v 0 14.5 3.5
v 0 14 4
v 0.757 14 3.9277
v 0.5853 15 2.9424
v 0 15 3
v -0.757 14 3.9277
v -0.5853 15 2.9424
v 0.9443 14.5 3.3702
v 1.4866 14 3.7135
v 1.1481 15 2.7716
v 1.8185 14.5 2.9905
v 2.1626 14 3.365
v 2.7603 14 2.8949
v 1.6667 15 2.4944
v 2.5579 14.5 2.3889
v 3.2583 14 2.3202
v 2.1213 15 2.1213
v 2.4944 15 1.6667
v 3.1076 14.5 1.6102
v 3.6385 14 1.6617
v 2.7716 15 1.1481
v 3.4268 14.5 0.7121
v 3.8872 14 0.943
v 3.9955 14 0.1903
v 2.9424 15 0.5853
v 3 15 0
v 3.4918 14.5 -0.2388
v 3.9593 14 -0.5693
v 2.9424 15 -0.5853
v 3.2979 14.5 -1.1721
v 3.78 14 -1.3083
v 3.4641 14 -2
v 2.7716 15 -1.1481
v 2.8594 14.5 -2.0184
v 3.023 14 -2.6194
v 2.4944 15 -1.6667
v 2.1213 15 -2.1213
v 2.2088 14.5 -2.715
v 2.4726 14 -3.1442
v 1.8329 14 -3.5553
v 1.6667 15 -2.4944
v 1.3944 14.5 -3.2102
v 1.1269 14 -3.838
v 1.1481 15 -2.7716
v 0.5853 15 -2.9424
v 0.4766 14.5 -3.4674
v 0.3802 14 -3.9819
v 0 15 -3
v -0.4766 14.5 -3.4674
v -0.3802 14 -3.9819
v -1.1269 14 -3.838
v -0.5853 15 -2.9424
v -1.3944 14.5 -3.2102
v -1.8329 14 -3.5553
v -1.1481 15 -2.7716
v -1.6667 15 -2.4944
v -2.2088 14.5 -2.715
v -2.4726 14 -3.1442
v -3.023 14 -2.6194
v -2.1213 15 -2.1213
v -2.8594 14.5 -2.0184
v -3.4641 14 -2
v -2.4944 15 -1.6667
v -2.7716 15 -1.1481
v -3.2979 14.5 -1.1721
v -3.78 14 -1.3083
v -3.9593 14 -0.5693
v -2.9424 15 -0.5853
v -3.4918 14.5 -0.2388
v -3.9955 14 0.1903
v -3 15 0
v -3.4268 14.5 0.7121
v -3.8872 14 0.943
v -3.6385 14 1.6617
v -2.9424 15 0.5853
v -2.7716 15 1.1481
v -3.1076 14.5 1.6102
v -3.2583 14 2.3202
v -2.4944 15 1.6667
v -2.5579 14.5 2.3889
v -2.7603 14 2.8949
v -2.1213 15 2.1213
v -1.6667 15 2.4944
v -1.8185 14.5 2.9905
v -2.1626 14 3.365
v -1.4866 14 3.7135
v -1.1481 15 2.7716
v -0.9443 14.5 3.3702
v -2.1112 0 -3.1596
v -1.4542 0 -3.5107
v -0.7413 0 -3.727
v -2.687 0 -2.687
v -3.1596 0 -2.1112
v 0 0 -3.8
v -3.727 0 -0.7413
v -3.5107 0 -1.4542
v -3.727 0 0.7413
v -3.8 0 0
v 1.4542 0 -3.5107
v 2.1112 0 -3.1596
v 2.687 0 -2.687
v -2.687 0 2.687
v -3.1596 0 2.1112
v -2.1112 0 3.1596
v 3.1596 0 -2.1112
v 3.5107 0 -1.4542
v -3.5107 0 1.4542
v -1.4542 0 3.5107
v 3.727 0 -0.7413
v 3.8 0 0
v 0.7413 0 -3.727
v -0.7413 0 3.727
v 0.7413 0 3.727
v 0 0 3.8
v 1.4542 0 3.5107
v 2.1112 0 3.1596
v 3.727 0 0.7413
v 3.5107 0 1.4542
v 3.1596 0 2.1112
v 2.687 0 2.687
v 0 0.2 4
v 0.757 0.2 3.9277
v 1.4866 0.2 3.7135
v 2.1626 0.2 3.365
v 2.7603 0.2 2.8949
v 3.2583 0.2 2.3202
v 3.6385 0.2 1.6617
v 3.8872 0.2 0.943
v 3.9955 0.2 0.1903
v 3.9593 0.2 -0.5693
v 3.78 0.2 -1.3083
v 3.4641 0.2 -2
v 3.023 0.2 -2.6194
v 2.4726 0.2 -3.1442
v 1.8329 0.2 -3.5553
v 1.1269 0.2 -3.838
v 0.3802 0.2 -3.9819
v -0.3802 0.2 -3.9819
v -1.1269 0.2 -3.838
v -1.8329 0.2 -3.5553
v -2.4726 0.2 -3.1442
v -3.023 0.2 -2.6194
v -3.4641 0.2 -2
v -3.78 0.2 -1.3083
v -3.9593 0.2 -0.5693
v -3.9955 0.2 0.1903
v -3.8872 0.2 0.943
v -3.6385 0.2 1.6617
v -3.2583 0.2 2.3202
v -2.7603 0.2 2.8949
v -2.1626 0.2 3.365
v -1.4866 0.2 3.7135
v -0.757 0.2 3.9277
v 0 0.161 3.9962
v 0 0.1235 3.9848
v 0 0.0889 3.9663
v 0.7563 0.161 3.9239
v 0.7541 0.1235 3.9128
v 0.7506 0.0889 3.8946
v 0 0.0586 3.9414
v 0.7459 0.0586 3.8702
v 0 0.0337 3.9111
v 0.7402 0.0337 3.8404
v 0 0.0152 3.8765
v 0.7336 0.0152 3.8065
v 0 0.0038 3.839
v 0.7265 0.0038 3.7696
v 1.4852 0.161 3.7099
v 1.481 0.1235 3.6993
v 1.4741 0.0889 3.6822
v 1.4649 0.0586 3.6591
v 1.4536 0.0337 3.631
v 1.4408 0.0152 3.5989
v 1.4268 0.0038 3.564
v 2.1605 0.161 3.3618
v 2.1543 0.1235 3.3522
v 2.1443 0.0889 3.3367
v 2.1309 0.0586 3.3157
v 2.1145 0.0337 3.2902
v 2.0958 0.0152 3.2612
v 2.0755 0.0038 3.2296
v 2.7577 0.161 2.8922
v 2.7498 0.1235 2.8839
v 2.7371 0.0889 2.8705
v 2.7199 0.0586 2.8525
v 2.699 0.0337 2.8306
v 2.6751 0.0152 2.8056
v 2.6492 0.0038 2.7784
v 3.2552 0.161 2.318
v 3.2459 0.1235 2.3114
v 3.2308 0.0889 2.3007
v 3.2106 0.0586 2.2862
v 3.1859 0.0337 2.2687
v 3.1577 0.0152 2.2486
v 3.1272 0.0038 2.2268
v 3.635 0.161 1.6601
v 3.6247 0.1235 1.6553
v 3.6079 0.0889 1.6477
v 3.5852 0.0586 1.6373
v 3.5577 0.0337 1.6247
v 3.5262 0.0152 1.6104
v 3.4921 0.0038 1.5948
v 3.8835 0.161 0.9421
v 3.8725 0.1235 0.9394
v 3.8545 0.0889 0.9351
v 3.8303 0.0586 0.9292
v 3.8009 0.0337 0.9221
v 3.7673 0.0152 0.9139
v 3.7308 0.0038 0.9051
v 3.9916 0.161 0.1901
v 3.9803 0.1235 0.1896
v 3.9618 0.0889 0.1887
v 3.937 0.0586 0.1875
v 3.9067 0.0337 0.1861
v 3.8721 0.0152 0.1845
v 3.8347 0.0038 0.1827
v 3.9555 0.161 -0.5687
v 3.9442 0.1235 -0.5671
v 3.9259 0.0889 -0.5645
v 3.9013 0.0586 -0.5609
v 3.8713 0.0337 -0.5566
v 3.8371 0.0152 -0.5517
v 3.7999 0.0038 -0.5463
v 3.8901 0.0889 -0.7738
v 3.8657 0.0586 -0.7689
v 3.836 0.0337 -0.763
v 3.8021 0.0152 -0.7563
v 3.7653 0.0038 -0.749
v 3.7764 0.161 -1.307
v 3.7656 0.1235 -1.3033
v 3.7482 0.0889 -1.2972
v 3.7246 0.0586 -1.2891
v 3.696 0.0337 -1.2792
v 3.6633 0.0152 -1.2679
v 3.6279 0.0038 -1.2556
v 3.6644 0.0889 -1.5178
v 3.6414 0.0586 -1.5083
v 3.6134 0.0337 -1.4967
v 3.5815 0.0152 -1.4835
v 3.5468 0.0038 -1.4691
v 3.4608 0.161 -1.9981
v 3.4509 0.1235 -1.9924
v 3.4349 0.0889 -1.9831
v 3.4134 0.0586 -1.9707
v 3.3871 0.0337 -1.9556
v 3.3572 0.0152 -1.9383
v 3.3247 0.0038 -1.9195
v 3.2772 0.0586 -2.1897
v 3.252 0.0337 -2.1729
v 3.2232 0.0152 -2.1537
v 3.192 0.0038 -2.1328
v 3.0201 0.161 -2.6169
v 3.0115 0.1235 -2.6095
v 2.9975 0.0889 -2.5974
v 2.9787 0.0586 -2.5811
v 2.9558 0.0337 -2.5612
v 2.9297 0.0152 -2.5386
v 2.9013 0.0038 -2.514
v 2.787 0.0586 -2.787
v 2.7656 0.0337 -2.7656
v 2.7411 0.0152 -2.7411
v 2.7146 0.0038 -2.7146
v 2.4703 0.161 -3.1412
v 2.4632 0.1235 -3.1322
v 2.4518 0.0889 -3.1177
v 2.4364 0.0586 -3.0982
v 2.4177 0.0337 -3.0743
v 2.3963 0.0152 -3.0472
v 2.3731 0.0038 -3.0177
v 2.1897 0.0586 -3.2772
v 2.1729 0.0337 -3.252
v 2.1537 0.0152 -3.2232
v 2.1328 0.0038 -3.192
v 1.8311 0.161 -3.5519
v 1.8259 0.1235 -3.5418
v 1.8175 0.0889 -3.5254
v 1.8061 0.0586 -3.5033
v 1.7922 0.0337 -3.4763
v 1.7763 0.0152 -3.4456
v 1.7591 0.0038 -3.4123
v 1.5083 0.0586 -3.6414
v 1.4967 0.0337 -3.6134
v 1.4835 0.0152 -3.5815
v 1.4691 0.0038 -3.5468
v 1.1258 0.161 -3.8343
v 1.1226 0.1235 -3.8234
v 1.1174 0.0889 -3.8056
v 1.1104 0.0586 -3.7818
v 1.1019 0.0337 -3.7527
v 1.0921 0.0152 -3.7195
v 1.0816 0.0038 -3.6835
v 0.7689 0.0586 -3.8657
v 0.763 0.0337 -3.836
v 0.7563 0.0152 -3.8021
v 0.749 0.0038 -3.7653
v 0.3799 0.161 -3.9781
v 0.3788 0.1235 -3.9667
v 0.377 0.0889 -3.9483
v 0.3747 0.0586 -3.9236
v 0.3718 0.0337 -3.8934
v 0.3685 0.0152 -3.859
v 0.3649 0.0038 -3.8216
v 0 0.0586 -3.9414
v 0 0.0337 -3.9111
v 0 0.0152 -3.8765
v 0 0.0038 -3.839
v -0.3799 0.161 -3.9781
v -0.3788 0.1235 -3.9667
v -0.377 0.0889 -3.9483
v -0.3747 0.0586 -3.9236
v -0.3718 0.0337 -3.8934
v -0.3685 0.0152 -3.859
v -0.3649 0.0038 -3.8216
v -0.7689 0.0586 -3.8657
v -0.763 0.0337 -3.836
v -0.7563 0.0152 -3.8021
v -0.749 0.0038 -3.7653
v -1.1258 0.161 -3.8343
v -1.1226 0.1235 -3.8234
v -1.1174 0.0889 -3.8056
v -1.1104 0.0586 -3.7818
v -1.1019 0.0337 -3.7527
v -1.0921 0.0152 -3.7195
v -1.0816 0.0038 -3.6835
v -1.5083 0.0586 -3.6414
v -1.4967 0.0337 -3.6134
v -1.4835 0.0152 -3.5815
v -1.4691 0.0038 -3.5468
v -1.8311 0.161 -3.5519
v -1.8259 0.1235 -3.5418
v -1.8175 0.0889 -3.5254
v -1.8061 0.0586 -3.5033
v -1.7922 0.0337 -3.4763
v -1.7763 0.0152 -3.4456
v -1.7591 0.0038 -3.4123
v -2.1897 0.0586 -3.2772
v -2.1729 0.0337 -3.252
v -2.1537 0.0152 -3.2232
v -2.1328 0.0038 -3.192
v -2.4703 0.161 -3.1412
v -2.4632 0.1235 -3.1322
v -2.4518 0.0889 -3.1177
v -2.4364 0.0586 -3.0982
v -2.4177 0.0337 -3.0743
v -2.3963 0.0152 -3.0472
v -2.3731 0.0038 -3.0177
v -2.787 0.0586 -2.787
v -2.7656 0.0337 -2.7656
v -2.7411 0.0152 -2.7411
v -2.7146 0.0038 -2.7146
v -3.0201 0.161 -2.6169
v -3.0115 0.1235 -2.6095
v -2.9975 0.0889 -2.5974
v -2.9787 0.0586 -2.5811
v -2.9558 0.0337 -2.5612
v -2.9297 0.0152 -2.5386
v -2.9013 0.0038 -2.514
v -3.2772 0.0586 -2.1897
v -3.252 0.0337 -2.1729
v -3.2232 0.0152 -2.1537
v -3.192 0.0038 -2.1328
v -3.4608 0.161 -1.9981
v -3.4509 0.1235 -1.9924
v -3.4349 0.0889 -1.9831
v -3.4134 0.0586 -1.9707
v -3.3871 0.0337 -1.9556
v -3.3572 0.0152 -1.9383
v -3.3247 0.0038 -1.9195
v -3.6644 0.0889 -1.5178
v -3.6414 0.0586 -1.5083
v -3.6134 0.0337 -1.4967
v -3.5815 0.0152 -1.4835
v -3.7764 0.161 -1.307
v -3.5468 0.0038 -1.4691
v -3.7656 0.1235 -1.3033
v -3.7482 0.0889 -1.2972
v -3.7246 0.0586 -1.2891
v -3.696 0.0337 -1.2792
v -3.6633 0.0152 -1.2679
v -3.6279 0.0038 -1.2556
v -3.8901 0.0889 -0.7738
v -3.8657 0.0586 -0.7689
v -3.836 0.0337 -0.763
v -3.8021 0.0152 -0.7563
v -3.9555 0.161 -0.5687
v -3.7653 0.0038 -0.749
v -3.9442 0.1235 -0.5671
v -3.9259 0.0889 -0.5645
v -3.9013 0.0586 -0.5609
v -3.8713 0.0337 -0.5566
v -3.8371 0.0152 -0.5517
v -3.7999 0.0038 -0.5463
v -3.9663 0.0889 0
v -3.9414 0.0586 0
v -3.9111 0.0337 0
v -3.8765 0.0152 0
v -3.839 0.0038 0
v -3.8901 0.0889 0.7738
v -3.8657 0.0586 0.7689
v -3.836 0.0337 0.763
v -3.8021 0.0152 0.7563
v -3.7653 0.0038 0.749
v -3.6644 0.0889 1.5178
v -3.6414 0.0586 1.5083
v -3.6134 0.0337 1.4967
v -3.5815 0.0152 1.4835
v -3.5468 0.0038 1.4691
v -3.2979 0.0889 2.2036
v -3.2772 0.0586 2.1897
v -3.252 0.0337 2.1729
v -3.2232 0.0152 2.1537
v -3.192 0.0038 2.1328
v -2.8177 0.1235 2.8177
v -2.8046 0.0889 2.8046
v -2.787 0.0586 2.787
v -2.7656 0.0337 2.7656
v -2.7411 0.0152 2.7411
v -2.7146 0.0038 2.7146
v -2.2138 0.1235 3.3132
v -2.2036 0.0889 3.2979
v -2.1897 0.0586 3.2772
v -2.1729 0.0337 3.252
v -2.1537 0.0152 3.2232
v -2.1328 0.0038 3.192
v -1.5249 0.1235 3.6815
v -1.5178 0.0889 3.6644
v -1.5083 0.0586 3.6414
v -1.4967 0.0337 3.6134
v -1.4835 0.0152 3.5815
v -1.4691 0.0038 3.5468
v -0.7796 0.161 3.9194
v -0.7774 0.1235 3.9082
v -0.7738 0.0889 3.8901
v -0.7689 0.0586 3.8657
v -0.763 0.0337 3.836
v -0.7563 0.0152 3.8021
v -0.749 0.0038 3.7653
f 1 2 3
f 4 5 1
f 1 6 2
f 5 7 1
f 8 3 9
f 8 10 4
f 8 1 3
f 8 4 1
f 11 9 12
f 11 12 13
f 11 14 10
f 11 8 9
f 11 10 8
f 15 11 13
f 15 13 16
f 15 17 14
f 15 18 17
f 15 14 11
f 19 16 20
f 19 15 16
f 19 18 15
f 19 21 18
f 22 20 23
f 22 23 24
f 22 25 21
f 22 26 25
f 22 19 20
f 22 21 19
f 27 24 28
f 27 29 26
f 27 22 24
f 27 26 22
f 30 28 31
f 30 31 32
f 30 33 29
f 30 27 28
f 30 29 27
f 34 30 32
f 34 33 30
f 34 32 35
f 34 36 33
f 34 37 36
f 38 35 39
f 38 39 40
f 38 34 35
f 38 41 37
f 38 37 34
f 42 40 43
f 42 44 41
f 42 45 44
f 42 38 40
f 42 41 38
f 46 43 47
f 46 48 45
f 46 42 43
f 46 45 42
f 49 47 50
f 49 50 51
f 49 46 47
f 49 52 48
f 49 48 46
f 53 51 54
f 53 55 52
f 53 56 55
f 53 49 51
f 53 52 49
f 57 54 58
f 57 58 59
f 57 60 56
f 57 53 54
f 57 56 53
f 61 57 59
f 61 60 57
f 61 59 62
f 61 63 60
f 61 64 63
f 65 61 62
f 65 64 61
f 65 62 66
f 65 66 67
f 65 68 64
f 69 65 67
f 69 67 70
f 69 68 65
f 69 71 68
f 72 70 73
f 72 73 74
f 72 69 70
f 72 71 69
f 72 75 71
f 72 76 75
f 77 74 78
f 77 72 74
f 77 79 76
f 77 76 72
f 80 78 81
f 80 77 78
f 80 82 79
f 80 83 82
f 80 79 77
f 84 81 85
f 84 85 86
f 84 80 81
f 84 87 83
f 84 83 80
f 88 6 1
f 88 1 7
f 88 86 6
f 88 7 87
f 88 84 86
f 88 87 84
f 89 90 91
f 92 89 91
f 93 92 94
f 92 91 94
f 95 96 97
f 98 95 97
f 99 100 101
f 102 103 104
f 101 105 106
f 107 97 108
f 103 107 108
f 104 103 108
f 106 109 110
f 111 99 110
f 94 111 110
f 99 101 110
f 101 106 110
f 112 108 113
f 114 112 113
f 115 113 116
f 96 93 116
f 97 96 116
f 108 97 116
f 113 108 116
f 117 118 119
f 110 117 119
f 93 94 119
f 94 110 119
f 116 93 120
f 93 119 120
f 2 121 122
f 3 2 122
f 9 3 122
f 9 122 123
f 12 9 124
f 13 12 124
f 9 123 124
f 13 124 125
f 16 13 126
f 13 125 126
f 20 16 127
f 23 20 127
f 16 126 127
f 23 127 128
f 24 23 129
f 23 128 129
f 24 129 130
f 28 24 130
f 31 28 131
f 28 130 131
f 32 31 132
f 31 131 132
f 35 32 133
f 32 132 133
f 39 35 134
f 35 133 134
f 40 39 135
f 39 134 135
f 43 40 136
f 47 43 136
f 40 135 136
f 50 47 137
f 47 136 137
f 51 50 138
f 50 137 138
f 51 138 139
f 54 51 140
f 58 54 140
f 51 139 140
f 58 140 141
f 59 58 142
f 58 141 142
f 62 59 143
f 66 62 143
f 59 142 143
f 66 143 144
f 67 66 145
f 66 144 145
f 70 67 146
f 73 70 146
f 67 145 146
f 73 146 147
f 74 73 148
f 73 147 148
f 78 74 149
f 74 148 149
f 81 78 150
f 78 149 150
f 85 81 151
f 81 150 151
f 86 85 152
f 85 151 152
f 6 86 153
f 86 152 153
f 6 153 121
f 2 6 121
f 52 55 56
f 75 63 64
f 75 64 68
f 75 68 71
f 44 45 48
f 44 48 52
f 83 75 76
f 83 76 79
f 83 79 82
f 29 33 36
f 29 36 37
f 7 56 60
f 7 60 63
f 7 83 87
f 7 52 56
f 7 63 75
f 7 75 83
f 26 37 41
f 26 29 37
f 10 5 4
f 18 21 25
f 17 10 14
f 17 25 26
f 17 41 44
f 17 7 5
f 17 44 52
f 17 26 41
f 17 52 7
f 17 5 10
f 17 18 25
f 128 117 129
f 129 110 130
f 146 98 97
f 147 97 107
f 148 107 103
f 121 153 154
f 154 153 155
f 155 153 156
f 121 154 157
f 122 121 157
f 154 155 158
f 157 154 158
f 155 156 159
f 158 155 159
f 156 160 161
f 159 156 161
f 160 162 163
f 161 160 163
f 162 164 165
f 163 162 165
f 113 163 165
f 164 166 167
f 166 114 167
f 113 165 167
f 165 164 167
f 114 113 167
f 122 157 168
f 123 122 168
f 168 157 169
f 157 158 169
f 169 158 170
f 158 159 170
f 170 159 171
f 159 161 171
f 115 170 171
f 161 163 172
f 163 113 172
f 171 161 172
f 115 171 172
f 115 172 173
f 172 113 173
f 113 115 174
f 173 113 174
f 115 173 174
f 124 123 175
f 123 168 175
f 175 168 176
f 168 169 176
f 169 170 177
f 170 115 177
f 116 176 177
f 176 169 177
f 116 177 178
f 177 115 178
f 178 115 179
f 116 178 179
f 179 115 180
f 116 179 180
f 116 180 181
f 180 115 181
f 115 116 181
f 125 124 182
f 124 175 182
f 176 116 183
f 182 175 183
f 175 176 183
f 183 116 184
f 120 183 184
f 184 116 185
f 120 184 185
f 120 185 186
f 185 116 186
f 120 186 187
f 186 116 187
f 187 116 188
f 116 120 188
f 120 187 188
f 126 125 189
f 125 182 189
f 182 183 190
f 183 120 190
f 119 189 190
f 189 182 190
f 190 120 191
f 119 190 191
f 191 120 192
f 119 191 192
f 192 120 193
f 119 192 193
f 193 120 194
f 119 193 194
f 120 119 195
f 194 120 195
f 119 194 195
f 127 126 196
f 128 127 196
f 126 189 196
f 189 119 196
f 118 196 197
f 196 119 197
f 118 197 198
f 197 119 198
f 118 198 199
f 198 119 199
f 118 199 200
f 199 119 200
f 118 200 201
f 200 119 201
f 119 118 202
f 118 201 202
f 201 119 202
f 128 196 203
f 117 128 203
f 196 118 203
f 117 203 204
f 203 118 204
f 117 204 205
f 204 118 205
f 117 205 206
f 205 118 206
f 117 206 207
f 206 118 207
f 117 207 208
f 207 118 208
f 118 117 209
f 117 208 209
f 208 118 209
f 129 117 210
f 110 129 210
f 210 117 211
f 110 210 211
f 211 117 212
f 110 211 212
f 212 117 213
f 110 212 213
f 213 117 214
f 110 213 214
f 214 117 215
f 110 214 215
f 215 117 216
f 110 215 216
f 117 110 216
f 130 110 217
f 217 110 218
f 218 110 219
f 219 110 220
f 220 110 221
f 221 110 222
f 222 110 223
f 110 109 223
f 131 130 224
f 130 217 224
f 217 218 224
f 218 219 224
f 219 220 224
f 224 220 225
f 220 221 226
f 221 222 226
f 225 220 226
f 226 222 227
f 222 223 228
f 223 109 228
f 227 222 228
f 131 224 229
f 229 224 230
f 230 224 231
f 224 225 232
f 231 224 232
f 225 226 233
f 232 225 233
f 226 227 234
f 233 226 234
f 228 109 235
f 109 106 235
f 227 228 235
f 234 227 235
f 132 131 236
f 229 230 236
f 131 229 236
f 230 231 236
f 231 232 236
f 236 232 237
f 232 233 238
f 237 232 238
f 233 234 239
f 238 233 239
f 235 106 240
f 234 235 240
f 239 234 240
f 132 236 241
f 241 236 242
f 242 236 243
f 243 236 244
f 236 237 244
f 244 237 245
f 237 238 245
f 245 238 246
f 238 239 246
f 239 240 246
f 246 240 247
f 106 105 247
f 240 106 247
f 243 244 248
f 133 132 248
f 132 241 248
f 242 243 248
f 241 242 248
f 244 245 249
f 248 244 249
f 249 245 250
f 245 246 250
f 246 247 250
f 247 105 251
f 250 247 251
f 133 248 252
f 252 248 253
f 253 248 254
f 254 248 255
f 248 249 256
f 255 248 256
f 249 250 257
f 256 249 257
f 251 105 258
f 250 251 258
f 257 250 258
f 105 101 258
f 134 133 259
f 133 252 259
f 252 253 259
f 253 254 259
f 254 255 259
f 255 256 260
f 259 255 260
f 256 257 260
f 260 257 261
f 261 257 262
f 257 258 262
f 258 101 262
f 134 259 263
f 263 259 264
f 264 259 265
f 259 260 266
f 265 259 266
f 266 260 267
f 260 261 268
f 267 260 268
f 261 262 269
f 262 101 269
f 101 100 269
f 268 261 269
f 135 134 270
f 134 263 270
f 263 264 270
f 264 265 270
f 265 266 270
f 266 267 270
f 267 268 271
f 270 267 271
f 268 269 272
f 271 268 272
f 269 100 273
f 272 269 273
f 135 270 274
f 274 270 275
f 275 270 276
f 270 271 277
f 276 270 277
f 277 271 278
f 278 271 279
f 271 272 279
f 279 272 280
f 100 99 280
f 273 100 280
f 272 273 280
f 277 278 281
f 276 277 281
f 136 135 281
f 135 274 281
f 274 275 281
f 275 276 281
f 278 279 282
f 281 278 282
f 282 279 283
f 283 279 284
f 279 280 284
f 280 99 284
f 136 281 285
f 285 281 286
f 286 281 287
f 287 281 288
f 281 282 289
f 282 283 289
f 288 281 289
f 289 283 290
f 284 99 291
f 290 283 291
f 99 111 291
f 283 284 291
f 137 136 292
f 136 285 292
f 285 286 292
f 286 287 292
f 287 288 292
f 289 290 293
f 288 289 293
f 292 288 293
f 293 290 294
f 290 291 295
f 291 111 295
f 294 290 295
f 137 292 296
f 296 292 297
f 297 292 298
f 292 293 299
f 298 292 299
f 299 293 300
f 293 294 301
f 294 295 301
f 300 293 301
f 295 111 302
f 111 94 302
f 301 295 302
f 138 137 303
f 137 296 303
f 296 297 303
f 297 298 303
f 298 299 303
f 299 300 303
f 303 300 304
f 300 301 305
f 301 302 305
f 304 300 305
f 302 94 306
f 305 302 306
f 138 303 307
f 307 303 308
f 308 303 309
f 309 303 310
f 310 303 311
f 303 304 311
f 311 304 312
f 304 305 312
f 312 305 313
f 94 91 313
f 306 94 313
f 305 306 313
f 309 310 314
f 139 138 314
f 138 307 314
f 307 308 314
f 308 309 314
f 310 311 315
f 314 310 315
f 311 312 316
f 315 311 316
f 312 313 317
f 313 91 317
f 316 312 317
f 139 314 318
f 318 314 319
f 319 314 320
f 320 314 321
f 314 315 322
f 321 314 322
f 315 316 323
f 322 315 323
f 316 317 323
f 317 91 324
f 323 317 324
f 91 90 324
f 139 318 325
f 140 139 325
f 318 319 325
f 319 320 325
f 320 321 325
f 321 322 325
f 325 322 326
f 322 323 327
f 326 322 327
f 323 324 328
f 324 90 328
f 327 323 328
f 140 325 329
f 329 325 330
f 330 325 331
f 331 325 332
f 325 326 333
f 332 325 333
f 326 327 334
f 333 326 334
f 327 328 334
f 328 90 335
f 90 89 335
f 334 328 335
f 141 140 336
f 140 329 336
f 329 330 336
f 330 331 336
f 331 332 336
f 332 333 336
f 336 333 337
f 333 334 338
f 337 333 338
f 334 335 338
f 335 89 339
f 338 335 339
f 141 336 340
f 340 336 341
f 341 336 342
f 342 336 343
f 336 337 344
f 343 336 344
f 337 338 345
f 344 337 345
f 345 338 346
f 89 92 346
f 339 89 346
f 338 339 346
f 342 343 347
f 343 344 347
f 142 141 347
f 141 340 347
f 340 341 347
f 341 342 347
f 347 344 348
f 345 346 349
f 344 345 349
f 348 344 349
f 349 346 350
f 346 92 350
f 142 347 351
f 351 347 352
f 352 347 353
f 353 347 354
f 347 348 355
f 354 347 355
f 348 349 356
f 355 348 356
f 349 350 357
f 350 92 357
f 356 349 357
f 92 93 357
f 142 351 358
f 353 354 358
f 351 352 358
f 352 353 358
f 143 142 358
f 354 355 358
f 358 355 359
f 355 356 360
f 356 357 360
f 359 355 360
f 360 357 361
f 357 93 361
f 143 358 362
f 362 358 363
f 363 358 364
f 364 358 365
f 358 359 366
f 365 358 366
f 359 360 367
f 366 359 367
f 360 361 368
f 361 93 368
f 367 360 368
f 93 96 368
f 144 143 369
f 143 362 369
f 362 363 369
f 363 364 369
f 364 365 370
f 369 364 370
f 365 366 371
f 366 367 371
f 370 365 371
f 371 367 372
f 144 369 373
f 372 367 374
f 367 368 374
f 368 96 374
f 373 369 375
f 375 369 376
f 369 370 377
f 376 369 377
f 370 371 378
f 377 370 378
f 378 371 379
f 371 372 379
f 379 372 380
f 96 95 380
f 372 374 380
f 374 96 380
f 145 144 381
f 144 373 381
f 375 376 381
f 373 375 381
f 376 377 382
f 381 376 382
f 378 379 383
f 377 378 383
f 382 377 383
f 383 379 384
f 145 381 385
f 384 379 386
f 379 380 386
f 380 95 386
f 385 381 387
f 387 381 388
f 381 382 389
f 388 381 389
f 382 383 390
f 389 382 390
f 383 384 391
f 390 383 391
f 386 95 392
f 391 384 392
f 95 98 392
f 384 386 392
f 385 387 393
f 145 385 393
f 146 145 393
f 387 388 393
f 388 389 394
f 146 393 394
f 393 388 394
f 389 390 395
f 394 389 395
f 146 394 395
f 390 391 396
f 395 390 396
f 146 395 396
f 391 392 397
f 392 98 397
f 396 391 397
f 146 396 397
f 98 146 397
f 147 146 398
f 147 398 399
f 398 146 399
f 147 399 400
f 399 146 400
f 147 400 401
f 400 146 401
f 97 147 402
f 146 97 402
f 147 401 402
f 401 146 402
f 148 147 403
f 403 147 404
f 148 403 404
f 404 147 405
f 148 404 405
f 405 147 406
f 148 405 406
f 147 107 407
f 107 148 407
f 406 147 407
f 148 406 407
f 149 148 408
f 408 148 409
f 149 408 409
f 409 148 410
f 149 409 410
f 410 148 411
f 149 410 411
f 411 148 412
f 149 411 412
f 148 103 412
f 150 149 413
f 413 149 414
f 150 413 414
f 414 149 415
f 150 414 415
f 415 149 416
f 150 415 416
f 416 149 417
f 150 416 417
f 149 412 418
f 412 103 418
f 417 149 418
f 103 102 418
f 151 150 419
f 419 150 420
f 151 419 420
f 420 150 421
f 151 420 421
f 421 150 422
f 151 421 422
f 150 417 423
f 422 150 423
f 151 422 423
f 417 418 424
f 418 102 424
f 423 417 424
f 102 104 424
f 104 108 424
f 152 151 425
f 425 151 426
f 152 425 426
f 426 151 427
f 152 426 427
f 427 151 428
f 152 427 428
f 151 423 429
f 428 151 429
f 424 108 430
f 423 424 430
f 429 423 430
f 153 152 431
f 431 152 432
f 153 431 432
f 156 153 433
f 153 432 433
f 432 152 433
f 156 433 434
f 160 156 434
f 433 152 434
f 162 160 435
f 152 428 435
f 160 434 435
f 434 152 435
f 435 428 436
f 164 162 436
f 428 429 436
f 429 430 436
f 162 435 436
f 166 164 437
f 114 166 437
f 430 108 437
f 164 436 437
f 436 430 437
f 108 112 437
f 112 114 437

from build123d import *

# Parameters (mm, degrees)
SKETCH_1_R      = 4
EXTRUDE_1_DEPTH = 15
CHAMFER_1_SIZE  = 1
FILLET_1_R      = 0.2


with BuildPart() as part:
    # 草图1 → 凸台-拉伸1 (new body)
    with BuildSketch(Plane(origin=(0, 0, 0), x_dir=(1, 0, 0), z_dir=(0, 1, 0))):
        with Locations(Location((0, 0, 0), (0, 0, 270))):
            Circle(SKETCH_1_R)
    extrude(amount=EXTRUDE_1_DEPTH)

    # 倒角1
    chamfer_1_edges = [part.edges().sort_by_distance(p)[0] for p in [
        (0, 15, -4),
    ]]
    chamfer(chamfer_1_edges, length=CHAMFER_1_SIZE)

    # 圆角1
    fillet_1_edges = [part.edges().sort_by_distance(p)[0] for p in [
        (0, 0, -4),
    ]]
    fillet(fillet_1_edges, radius=FILLET_1_R)


solid = part.part
